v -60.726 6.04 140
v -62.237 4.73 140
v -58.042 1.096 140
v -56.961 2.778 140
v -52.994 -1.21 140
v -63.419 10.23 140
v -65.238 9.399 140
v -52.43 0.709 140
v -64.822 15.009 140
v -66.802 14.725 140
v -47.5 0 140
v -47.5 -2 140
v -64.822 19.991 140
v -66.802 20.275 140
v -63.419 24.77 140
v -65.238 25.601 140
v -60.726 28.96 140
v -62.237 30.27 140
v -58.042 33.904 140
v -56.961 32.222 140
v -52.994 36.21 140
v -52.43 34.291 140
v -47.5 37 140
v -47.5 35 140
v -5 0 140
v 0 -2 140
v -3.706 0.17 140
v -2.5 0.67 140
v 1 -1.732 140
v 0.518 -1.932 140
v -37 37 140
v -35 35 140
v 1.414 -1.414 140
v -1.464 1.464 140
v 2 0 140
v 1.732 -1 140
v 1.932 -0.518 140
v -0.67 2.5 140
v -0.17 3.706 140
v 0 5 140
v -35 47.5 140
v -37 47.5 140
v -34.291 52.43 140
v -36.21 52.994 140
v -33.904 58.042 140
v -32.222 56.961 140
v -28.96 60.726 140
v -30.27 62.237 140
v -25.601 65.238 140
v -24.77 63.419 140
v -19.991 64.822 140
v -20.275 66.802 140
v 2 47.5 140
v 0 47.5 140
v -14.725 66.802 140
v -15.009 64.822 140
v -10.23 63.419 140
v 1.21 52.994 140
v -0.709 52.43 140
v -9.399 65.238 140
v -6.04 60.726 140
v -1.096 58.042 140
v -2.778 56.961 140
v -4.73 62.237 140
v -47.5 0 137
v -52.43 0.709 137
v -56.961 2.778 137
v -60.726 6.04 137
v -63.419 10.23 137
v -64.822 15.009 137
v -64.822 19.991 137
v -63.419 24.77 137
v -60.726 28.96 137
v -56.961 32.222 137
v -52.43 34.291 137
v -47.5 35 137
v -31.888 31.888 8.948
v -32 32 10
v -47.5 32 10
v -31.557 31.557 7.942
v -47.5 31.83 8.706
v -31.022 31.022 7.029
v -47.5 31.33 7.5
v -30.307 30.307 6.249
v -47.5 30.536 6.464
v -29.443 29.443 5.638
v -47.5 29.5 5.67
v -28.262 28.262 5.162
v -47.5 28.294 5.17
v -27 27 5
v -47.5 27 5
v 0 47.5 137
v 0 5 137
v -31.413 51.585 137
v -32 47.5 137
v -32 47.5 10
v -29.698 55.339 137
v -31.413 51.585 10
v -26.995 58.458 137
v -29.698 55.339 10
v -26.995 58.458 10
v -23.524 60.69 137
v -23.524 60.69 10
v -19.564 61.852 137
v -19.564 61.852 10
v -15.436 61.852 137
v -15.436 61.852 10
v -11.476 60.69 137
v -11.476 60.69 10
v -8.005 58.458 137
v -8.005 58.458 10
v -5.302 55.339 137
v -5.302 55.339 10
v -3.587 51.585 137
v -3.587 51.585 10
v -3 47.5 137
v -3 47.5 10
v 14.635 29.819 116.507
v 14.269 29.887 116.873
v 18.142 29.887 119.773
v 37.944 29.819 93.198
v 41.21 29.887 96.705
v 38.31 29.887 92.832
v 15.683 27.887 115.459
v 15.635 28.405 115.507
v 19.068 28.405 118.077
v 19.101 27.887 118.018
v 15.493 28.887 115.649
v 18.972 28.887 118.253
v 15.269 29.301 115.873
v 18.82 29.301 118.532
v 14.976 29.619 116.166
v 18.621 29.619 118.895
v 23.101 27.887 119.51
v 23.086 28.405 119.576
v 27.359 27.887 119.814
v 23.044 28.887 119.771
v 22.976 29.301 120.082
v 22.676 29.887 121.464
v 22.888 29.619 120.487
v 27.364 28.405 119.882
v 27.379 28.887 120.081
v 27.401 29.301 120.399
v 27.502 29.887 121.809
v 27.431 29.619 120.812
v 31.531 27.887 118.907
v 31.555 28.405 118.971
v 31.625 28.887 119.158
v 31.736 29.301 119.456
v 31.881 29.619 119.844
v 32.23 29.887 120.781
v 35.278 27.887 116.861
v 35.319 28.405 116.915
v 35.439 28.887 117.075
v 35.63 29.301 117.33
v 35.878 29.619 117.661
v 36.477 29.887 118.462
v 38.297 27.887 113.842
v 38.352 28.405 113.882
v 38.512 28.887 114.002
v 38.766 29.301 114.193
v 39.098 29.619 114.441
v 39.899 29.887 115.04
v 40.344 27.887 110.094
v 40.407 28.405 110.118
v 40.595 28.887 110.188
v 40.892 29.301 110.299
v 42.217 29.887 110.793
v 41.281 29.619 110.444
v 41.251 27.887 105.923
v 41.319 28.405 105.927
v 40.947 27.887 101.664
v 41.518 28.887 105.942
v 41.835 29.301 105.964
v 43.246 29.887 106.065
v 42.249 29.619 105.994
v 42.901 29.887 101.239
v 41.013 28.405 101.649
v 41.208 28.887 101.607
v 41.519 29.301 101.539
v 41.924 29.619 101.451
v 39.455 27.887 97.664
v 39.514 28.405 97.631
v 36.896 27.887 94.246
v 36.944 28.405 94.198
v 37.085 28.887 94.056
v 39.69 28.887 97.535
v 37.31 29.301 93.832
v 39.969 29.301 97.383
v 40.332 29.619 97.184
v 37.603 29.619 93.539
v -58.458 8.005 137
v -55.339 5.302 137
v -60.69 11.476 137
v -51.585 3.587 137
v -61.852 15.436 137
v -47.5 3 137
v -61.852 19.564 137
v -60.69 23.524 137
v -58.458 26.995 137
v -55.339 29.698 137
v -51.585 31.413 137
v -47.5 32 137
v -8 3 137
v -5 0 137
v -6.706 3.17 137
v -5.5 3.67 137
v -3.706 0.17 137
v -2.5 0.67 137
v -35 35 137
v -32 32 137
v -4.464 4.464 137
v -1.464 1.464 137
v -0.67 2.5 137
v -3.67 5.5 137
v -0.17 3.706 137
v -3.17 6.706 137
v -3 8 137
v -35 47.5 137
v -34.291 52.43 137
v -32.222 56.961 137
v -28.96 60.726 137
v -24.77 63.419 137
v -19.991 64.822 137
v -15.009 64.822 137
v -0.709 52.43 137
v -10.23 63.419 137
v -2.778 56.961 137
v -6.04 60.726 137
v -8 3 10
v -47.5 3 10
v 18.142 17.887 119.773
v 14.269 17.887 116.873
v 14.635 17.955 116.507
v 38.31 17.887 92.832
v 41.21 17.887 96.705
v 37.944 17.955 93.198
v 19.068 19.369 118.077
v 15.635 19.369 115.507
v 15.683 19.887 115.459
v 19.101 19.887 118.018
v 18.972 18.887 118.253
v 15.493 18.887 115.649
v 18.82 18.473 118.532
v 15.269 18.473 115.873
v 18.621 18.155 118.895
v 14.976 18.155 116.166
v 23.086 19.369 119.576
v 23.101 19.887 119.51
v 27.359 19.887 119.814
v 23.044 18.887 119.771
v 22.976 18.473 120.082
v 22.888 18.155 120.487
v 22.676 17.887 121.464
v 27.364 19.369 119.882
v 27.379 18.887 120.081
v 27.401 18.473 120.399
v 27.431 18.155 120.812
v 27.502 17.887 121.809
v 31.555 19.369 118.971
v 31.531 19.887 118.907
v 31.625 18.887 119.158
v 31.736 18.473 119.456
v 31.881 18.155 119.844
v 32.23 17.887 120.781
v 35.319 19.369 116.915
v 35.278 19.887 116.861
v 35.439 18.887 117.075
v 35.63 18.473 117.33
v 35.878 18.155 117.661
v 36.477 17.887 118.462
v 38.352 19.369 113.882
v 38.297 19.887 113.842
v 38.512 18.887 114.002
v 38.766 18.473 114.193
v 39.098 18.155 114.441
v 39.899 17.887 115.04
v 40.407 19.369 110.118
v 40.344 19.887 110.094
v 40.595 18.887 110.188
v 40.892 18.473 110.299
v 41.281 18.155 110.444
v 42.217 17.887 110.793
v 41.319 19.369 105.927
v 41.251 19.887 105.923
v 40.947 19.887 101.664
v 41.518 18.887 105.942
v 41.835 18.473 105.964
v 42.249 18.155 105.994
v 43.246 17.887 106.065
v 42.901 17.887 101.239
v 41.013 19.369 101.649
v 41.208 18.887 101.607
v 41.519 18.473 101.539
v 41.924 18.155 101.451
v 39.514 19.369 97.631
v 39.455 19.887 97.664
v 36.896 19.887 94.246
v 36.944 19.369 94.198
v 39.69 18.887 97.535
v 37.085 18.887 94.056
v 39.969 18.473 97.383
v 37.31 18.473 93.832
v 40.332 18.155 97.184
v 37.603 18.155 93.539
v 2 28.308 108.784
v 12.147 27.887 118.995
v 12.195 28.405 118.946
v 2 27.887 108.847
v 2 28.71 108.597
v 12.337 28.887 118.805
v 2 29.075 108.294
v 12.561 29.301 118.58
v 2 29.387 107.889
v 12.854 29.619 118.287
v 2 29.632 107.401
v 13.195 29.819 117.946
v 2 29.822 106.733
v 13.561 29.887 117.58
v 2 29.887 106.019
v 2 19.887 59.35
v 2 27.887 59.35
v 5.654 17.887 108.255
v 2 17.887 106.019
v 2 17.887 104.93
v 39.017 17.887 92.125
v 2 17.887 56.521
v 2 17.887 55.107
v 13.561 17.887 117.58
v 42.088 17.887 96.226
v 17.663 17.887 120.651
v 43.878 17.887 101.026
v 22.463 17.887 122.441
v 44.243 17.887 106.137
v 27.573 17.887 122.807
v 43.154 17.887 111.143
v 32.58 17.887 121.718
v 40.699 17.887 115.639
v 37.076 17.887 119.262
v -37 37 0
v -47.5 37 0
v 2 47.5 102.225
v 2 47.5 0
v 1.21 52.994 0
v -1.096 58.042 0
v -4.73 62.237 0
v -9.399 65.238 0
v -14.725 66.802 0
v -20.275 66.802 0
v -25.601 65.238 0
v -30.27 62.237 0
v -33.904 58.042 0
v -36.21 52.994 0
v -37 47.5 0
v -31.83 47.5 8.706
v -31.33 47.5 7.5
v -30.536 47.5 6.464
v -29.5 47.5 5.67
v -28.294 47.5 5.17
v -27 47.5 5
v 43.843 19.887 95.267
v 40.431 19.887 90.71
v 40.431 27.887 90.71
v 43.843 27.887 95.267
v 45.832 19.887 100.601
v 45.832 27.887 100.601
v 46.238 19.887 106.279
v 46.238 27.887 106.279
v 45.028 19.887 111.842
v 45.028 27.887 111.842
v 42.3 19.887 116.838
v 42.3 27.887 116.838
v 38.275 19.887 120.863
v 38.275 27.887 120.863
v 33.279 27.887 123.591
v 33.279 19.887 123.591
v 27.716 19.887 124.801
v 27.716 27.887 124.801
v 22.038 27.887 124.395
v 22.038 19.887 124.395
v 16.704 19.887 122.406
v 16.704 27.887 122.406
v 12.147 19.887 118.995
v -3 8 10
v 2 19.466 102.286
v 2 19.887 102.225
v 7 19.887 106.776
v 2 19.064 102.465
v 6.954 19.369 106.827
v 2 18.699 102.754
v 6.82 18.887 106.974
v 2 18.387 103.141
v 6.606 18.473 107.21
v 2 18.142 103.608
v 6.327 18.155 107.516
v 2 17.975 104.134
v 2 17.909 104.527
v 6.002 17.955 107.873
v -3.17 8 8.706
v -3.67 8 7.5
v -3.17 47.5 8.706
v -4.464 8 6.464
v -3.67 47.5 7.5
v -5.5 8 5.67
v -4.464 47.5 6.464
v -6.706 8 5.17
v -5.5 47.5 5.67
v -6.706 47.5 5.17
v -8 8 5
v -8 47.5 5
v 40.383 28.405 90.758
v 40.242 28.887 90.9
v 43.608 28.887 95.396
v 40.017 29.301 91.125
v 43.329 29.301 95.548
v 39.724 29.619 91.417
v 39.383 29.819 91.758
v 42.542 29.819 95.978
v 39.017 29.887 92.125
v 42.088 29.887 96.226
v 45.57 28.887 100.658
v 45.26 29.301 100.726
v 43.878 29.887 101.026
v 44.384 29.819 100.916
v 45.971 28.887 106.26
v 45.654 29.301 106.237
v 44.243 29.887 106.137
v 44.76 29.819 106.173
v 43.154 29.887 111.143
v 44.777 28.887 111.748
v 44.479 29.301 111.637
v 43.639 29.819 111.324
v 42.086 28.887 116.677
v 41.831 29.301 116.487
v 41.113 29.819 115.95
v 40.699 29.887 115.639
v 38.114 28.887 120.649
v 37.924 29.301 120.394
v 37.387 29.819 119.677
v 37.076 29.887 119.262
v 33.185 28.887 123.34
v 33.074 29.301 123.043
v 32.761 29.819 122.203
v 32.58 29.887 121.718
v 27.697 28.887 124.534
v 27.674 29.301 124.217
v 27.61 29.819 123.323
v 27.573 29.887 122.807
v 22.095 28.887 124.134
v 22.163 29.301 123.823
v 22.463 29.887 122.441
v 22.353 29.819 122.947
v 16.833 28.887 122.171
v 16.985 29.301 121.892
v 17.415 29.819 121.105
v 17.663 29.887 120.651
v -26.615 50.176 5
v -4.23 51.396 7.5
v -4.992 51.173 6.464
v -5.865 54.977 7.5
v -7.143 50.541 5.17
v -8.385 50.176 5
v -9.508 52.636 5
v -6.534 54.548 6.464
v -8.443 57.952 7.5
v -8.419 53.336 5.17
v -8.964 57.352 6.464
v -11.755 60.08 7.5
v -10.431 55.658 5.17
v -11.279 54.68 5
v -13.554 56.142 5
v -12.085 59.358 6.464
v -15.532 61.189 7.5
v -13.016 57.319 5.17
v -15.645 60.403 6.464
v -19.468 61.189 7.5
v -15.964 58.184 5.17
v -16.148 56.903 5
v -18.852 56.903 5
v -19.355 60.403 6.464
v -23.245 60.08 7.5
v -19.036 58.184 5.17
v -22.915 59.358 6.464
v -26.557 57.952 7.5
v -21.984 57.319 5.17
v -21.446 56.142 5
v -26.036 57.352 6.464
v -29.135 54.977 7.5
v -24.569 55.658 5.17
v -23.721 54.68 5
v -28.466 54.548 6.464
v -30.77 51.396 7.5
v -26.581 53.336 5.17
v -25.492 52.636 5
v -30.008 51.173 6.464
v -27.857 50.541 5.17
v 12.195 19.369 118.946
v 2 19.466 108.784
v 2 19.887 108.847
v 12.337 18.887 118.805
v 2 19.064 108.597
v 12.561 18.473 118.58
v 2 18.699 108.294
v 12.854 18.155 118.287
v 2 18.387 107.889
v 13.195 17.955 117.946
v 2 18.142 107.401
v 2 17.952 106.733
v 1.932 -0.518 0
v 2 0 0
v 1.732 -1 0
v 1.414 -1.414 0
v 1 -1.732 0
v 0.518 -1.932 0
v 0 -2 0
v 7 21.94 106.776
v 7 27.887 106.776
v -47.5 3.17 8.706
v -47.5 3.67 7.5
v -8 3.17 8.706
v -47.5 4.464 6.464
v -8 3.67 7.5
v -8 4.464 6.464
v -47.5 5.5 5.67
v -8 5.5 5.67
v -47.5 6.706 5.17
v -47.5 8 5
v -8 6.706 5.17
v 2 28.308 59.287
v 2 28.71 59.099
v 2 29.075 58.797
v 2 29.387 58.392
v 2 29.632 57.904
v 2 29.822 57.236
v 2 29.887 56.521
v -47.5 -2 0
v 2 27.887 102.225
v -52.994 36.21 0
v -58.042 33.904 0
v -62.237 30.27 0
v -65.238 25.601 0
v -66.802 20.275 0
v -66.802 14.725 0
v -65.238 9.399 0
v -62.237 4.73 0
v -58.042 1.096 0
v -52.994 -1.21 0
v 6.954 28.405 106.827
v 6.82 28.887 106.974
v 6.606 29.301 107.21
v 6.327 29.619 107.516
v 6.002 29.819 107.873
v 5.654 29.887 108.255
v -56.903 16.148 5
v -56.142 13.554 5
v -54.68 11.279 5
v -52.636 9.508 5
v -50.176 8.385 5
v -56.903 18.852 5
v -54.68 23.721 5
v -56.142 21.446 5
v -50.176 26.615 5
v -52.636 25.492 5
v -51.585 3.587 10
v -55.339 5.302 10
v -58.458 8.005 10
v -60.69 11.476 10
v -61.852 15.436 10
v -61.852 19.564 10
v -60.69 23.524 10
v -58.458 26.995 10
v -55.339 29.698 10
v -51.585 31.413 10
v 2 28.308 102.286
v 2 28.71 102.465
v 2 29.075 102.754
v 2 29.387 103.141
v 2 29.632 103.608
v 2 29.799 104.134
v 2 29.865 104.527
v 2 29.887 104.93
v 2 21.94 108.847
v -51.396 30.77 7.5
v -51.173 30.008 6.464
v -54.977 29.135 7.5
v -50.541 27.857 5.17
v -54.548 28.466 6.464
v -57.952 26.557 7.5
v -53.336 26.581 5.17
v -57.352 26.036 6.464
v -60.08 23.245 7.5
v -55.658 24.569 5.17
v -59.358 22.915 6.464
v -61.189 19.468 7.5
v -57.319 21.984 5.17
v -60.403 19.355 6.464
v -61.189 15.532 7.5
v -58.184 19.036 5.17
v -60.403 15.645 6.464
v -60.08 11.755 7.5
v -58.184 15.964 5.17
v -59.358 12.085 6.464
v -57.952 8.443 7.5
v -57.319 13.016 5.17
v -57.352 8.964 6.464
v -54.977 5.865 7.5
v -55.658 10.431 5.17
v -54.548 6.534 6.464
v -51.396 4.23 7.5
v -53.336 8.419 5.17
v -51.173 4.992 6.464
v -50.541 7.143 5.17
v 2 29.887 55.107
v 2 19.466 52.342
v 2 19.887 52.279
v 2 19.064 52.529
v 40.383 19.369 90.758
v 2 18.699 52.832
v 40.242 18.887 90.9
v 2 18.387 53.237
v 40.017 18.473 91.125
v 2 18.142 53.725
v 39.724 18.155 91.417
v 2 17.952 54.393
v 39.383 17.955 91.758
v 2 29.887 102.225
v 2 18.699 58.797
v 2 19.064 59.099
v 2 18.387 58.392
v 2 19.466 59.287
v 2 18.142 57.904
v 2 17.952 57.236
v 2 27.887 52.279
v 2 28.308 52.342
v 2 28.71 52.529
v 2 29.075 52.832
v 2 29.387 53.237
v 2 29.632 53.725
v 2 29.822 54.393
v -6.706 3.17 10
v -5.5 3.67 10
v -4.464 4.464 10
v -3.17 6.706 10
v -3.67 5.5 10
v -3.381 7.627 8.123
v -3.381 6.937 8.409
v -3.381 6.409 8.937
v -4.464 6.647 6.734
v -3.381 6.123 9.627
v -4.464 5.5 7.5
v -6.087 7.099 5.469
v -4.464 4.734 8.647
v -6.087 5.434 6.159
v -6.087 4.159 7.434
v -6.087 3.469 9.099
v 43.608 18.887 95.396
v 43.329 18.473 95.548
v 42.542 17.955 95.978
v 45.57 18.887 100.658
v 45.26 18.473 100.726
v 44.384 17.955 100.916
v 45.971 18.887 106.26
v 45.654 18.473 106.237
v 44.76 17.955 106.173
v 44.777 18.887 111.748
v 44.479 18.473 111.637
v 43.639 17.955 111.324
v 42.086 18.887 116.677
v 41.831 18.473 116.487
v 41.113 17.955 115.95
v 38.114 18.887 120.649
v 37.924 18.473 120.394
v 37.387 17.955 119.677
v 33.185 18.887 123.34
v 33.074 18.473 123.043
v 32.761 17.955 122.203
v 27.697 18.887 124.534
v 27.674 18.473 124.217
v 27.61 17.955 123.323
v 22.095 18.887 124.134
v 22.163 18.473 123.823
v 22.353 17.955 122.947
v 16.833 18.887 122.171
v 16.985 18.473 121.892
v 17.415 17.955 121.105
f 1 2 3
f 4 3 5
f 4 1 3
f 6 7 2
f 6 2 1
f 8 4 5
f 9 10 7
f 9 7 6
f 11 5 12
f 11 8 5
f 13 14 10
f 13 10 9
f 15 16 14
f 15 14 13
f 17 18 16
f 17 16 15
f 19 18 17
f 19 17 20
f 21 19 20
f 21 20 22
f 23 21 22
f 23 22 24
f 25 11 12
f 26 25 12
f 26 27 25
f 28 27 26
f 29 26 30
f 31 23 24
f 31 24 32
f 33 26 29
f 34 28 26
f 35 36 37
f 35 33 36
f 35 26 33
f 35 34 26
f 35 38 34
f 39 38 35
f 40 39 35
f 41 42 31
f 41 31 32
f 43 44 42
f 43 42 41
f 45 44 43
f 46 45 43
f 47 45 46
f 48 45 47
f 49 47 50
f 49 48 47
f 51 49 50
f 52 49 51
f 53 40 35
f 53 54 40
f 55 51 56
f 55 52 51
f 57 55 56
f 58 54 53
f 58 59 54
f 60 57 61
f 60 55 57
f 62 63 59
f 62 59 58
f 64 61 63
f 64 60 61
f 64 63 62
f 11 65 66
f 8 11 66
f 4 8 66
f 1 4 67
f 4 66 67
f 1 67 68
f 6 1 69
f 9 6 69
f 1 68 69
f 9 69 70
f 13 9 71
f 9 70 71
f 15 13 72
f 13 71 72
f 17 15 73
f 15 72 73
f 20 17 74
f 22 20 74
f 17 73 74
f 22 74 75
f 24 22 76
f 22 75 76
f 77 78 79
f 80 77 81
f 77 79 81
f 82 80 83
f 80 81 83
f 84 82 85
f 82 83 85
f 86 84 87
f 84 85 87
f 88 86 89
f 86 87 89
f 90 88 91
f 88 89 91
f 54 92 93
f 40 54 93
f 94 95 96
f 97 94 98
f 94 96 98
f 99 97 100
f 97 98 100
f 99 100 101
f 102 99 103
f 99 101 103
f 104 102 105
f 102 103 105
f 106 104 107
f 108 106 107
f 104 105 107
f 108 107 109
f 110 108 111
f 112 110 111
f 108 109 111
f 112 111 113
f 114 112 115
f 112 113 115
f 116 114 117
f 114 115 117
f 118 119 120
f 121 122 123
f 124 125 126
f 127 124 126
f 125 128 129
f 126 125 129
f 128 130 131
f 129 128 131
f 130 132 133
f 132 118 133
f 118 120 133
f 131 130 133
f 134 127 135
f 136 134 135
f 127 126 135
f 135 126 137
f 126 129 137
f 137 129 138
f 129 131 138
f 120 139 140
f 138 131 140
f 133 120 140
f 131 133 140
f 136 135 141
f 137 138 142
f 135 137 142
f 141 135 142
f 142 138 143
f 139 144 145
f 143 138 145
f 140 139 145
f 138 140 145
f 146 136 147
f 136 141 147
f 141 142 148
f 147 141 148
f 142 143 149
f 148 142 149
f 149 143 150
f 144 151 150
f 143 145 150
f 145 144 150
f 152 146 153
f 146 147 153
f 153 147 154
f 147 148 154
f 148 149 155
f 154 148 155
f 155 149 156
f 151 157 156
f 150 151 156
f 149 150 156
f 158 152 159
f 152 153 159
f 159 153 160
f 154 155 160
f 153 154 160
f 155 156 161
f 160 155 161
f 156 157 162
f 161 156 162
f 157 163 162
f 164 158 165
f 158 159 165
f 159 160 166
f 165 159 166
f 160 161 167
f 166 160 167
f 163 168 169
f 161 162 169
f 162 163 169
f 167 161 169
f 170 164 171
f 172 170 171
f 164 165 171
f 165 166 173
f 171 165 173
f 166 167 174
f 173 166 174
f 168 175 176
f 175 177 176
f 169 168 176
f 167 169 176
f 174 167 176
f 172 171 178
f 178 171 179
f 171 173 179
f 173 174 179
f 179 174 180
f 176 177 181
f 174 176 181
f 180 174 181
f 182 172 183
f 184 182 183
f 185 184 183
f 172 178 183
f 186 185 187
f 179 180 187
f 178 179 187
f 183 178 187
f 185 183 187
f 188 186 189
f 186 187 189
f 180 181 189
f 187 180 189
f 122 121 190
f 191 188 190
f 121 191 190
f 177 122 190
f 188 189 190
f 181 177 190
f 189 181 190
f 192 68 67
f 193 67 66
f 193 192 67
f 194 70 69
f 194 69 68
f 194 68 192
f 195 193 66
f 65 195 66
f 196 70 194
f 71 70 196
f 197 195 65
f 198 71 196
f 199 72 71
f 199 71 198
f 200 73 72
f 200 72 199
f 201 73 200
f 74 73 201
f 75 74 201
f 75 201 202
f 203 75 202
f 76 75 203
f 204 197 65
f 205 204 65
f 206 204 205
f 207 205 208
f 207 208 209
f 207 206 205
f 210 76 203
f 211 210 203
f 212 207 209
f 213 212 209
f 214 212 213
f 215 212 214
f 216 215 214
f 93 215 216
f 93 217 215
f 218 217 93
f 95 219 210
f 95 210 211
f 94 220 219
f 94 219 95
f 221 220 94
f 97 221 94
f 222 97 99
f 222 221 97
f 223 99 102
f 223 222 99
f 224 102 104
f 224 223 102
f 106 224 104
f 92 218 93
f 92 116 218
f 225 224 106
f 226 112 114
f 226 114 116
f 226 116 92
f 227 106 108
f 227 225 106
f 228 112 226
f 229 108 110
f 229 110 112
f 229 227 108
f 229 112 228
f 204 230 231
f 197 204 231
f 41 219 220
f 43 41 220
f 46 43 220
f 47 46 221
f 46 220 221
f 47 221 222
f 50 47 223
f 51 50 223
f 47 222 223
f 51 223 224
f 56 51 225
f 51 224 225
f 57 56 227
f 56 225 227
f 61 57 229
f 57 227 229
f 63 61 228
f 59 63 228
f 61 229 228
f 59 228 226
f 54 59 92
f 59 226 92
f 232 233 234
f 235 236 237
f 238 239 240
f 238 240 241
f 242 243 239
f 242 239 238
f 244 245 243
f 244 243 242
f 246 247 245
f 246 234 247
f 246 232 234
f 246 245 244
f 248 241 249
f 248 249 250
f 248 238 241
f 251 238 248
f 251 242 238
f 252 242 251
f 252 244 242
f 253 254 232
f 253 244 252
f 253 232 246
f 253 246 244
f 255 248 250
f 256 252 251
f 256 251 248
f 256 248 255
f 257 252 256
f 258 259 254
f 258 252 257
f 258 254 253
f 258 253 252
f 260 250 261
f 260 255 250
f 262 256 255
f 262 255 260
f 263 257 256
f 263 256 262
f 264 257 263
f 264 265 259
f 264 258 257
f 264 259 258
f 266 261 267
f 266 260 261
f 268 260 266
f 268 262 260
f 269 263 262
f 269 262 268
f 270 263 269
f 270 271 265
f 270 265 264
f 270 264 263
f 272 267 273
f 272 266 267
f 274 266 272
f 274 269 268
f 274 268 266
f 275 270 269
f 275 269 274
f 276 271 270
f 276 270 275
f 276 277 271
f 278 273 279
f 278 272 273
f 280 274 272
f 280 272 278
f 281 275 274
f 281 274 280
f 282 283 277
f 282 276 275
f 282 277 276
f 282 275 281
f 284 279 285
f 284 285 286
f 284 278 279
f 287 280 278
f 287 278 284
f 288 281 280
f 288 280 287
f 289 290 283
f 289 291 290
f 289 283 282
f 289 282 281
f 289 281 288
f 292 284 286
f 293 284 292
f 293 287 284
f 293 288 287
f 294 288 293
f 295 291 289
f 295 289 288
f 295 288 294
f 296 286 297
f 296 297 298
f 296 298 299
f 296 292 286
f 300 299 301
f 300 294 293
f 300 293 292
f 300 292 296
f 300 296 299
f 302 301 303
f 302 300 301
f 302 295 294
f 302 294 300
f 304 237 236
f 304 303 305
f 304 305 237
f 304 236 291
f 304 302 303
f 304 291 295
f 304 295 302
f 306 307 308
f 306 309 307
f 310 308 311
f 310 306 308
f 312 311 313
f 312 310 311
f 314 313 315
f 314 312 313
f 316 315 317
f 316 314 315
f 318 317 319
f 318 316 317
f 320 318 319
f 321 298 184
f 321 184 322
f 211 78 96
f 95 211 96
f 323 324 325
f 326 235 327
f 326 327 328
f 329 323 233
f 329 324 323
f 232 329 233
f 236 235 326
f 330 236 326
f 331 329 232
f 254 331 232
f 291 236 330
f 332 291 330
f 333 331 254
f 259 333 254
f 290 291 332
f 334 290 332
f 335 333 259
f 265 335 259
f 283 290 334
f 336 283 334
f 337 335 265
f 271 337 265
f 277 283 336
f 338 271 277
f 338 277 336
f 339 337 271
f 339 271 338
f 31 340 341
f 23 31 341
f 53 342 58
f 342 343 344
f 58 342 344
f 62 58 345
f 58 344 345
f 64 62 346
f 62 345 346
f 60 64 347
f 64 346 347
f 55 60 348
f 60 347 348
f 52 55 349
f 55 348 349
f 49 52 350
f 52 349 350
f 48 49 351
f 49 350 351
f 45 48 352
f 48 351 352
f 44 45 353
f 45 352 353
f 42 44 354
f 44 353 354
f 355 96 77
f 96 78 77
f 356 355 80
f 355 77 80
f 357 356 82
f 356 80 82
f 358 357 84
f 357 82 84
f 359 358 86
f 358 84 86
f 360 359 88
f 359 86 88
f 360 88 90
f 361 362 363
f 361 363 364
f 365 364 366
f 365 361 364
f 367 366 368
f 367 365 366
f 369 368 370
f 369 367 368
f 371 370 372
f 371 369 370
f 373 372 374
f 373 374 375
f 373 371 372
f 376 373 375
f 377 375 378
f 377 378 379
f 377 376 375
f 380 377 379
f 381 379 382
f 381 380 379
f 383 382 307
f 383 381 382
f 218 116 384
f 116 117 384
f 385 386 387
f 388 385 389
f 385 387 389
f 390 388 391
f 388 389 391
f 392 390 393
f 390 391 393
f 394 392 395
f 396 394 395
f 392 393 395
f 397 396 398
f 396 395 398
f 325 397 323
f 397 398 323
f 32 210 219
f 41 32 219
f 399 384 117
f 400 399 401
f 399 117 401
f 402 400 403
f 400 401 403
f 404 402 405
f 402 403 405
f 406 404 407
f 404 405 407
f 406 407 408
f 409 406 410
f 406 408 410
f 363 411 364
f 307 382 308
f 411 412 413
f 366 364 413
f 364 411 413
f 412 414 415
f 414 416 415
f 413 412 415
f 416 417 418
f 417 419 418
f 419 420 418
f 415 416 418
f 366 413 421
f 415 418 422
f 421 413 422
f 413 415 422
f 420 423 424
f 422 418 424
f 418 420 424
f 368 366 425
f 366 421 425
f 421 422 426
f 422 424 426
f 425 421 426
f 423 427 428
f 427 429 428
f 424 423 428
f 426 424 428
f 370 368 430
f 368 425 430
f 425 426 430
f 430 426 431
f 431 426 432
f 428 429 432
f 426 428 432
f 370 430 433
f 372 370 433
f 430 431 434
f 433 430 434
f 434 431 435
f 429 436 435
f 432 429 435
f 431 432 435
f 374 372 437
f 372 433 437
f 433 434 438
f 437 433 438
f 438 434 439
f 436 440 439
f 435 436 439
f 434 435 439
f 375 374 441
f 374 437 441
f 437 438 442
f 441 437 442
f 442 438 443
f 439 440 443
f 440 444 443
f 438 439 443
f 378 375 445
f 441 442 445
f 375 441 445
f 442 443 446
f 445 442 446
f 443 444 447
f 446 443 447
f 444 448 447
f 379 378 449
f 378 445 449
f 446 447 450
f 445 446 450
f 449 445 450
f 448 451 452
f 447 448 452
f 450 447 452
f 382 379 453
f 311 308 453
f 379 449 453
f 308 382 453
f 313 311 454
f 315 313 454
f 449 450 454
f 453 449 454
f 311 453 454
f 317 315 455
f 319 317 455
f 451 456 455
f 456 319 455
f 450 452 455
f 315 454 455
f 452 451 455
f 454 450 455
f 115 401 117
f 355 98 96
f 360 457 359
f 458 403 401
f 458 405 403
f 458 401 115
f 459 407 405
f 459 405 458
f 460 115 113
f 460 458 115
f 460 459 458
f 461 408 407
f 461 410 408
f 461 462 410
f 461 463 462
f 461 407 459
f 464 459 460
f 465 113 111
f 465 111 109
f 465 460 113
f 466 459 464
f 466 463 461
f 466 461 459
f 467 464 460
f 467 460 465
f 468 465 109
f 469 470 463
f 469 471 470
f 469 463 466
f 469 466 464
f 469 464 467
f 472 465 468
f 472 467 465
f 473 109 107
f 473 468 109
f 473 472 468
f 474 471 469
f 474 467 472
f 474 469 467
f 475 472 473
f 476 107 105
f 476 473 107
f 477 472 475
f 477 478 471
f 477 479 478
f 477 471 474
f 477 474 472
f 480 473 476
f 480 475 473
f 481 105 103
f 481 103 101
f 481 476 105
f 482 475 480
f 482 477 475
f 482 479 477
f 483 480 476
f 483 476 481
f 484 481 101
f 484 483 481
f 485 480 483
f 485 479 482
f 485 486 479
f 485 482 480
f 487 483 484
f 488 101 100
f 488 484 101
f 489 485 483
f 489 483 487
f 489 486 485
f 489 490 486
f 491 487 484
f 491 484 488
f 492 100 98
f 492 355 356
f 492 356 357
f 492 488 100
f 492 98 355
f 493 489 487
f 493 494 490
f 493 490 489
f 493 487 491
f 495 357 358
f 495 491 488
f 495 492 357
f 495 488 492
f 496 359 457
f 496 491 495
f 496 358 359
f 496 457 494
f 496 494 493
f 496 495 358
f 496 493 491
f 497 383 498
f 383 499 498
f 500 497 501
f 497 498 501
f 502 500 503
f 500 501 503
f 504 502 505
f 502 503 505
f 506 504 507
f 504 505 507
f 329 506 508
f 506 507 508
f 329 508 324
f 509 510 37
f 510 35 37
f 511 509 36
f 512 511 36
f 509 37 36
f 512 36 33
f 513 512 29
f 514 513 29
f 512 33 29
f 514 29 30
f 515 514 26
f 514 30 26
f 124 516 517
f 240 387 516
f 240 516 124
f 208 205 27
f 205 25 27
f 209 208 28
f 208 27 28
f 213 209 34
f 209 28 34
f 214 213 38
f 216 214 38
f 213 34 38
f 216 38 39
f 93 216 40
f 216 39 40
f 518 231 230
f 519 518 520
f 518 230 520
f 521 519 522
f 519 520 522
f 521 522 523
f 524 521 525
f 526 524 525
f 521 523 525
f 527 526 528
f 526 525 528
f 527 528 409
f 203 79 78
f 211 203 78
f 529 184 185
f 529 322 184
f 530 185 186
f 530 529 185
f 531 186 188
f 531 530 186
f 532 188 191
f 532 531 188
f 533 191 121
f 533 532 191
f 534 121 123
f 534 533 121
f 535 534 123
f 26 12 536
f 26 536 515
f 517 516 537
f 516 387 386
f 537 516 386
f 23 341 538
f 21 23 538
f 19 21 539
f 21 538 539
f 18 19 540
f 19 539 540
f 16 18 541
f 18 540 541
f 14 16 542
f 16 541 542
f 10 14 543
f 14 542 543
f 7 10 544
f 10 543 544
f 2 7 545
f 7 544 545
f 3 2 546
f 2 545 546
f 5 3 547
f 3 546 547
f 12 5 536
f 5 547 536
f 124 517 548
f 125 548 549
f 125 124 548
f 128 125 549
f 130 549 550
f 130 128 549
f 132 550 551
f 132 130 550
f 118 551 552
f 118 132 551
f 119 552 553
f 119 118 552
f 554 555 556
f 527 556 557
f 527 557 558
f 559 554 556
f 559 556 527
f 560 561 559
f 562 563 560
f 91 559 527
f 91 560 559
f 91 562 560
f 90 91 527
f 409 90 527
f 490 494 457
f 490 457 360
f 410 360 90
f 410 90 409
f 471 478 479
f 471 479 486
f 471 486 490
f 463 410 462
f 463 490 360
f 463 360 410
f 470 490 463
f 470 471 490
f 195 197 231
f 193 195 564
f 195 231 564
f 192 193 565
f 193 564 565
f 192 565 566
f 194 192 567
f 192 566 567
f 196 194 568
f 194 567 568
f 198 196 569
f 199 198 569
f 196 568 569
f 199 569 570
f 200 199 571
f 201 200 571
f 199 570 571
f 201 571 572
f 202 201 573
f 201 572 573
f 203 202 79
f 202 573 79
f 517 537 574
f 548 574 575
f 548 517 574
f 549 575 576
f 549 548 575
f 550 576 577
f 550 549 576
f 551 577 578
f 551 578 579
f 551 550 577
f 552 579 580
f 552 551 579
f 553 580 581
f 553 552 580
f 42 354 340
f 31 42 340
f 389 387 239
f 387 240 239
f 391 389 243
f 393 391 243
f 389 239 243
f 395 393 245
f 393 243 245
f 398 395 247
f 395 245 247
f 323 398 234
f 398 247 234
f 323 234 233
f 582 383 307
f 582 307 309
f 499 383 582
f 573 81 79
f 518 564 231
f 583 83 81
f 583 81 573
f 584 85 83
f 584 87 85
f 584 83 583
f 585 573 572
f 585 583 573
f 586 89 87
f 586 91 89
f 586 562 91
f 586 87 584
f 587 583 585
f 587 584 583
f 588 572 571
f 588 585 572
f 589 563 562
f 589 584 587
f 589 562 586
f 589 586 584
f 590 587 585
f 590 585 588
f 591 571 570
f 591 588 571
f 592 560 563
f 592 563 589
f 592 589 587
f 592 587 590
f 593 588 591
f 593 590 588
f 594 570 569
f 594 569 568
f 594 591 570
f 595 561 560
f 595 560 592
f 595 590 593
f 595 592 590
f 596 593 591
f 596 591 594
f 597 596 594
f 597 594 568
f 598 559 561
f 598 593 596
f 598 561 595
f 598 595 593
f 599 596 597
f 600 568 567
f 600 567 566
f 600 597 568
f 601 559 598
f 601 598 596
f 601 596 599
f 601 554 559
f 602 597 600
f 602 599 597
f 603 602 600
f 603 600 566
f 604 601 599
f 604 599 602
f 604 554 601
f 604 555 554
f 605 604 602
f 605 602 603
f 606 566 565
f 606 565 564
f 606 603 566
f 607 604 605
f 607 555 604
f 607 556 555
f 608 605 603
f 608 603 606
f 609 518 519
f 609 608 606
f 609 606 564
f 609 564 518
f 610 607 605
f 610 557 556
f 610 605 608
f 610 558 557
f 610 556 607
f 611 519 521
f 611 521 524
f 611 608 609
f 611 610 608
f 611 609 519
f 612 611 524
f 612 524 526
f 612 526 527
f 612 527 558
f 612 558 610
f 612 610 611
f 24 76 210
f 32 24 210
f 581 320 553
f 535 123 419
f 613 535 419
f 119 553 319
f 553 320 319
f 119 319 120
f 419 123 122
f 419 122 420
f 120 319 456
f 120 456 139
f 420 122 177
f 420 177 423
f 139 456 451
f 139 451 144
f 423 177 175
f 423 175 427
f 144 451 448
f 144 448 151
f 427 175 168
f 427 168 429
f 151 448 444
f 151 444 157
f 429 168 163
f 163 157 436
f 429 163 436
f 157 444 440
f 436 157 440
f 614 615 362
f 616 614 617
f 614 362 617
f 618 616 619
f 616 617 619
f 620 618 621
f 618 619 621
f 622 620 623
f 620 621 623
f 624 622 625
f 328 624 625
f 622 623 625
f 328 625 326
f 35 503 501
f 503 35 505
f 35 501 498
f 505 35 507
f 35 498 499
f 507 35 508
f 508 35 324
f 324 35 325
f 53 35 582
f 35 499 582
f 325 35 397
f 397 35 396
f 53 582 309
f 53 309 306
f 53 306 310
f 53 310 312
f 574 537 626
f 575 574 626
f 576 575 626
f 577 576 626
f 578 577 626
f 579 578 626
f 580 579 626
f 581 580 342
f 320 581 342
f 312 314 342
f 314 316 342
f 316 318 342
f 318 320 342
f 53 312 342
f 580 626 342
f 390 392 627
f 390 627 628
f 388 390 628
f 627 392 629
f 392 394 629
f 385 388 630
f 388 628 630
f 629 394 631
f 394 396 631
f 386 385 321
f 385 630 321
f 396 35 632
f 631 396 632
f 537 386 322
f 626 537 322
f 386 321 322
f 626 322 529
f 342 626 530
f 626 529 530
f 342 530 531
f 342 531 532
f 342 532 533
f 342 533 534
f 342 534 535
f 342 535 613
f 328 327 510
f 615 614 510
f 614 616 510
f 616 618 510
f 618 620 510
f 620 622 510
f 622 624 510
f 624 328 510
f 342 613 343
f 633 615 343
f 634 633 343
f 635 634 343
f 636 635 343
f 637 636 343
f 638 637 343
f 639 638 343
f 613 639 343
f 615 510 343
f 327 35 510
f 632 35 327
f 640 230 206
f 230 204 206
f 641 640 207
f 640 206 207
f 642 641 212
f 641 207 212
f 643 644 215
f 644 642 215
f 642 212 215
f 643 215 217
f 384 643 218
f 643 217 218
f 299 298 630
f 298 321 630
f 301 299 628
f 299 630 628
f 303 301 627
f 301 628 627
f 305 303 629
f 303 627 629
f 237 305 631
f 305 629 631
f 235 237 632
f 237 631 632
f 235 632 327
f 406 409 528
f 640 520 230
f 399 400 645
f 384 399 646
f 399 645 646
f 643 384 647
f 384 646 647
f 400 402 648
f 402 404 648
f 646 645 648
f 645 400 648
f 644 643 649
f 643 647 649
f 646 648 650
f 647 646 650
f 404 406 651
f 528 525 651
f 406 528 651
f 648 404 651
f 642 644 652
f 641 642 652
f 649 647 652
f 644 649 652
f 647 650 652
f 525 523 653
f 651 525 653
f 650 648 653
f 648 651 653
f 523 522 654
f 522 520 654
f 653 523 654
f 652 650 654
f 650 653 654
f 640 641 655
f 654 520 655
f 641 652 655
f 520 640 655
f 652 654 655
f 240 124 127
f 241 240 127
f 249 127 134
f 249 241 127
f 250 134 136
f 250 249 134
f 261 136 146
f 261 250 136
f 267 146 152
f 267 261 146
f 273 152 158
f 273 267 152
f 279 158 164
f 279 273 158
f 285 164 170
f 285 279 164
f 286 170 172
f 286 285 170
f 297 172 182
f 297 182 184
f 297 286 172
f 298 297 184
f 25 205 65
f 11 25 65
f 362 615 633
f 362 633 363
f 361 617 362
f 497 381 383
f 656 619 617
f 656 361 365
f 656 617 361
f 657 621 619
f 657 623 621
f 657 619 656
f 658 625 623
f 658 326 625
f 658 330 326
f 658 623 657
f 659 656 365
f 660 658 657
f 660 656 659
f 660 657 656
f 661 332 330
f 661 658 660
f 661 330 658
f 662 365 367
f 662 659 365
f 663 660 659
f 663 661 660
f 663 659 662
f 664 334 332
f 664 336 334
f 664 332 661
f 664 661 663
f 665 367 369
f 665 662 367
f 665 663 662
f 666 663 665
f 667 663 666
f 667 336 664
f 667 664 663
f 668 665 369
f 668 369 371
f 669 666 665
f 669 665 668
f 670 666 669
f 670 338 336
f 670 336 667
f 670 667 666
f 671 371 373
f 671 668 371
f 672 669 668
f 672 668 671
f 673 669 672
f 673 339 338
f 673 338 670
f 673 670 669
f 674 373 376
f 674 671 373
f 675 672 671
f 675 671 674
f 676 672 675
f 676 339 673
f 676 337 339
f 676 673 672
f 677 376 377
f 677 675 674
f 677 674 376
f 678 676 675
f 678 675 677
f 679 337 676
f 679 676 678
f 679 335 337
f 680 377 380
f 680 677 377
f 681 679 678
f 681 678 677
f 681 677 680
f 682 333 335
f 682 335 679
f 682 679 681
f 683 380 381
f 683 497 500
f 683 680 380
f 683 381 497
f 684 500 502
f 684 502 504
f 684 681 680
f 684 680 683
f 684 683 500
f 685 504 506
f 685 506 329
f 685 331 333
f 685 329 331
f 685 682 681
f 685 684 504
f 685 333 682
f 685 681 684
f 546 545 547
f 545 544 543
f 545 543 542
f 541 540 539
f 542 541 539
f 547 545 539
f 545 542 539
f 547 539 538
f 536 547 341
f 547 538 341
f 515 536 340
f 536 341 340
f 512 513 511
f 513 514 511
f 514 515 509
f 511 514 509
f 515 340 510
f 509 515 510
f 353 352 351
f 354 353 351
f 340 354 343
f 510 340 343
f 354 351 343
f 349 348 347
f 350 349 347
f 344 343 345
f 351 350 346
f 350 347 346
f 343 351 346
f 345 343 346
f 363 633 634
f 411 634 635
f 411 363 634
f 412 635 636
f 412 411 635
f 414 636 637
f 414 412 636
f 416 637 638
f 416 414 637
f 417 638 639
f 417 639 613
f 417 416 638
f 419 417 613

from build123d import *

# Parameters (mm, degrees)
F1_DEPTH = 140
F2_DEPTH = 137
F3_DEPTH = 5
F4_W     = 4.0531810373
F4_H     = 6.6223293543
F5_DEPTH = 5
F7_DEPTH = 12
F9_DEPTH = 31
F10_R    = 5
F11_R    = 2
F12_R    = 2
F13_R    = 5


with BuildPart() as f1:
    # F0 (on Top) → F1 (new body)
    with BuildSketch(Plane.XY):
        with BuildLine():
            Line((-37, 47.5), (-37, 37))
            Line((-37, 37), (-47.5, 37))
            ThreePointArc((-47.5, 37), (-67, 17.5), (-47.5, -2))
            Line((-47.5, -2), (2, -2))
            Line((2, -2), (2, 47.5))
            ThreePointArc((2, 47.5), (-17.5, 67), (-37, 47.5))
        make_face()
        with BuildLine():
            Line((0, 47.5), (0, 0))
            Line((0, 0), (-47.5, 0))
            ThreePointArc((-47.5, 0), (-65, 17.5), (-47.5, 35))
            Line((-47.5, 35), (-35, 35))
            Line((-35, 35), (-35, 47.5))
            ThreePointArc((-35, 47.5), (-17.5, 65), (0, 47.5))
        make_face(mode=Mode.SUBTRACT)
    extrude(amount=F1_DEPTH)

    # F0 (on Top) → F2 (join)
    with BuildSketch(Plane.XY):
        with BuildLine():
            Line((-47.5, 0), (0, 0))
            Line((0, 0), (0, 47.5))
            ThreePointArc((0, 47.5), (-17.5, 65), (-35, 47.5))
            Line((-35, 47.5), (-35, 35))
            Line((-35, 35), (-47.5, 35))
            ThreePointArc((-47.5, 35), (-65, 17.5), (-47.5, 0))
        make_face()
        with BuildLine():
            Line((-47.5, 32), (-32, 32))
            Line((-32, 32), (-32, 47.5))
            ThreePointArc((-32, 47.5), (-17.5, 62), (-3, 47.5))
            Line((-3, 47.5), (-3, 3))
            Line((-3, 3), (-47.5, 3))
            ThreePointArc((-47.5, 3), (-62, 17.5), (-47.5, 32))
        make_face(mode=Mode.SUBTRACT)
    extrude(amount=F2_DEPTH)

    # F0 (on Top) → F3 (join)
    with BuildSketch(Plane.XY):
        with BuildLine():
            Line((-32, 47.5), (-32, 32))
            Line((-32, 32), (-47.5, 32))
            ThreePointArc((-47.5, 32), (-62, 17.5), (-47.5, 3))
            Line((-47.5, 3), (-3, 3))
            Line((-3, 3), (-3, 47.5))
            ThreePointArc((-3, 47.5), (-17.5, 62), (-32, 47.5))
        make_face()
    extrude(amount=F3_DEPTH)

    # F4 (on face) → F5 (join)
    with BuildSketch(Plane.YZ.offset(2)):
        with Locations((19.9135849252, 105.5362299085)):
            Rectangle(F4_W, F4_H)
    extrude(amount=F5_DEPTH)

    # F6 (on face) → F7 (join)
    with BuildSketch(Plane.XZ.offset(-17.8869944066)):
        with BuildLine():
            Line((12.1471862551, 118.9945808407), (2, 108.8473945856))
            Line((2, 108.8473945856), (2, 102.2250652313))
            Line((2, 102.2250652313), (5.5355339059, 105.3118606797))
            Line((5.5355339059, 105.3118606797), (15.682720161, 115.4590469347))
            ThreePointArc((15.682720161, 115.4590469347), (36.8959235966, 115.4590469347), (36.8959235966, 94.2458434991))
            Line((36.8959235966, 94.2458434991), (2, 59.3499199026))
            Line((2, 59.3499199026), (2, 52.2788520907))
            Line((2, 52.2788520907), (40.4314575025, 90.7103095932))
            ThreePointArc((40.4314575025, 90.7103095932), (40.4314575025, 118.9945808407), (12.1471862551, 118.9945808407))
        make_face()
    extrude(amount=-F7_DEPTH)

    # F8 (on face) → F9 (cut)
    with BuildSketch(Plane.XZ.offset(-17.8869944066)):
        Polygon((7, 102.2250652313), (7, 106.7763267737), (2, 102.2250652313), align=None)
    extrude(amount=-F9_DEPTH, mode=Mode.SUBTRACT)

    # F10
    f10_edges = [f1.edges().sort_by_distance(p)[0] for p in [
        (-62, 17.5, 5),
        (-32, 39.75, 5),
        (-3, 3, 71),
    ]]
    fillet(f10_edges, radius=F10_R)

    # F11
    f11_edges = [f1.edges().sort_by_distance(p)[0] for p in [
        (40.431458, 17.886994, 118.994581),
        (7.073593, 17.886994, 113.920988),
        (21.215729, 17.886994, 71.494581),
        (36.895924, 17.886994, 115.459047),
        (11.34136, 17.886994, 111.117687),
        (4.5, 17.886994, 104.500696),
        (19.447962, 17.886994, 76.797882),
        (21.215729, 29.886994, 71.494581),
        (40.431458, 29.886994, 118.994581),
        (19.447962, 29.886994, 76.797882),
        (36.895924, 29.886994, 115.459047),
        (11.34136, 29.886994, 111.117687),
        (4.5, 29.886994, 104.500696),
        (7.073593, 29.886994, 113.920988),
    ]]
    fillet(f11_edges, radius=F11_R)

    # F12
    f12_edges = [f1.edges().sort_by_distance(p)[0] for p in [
        (2, -2, 70),
    ]]
    fillet(f12_edges, radius=F12_R)

    # F13
    f13_edges = [f1.edges().sort_by_distance(p)[0] for p in [
        (0, 0, 138.5),
    ]]
    fillet(f13_edges, radius=F13_R)


solid = f1.part
